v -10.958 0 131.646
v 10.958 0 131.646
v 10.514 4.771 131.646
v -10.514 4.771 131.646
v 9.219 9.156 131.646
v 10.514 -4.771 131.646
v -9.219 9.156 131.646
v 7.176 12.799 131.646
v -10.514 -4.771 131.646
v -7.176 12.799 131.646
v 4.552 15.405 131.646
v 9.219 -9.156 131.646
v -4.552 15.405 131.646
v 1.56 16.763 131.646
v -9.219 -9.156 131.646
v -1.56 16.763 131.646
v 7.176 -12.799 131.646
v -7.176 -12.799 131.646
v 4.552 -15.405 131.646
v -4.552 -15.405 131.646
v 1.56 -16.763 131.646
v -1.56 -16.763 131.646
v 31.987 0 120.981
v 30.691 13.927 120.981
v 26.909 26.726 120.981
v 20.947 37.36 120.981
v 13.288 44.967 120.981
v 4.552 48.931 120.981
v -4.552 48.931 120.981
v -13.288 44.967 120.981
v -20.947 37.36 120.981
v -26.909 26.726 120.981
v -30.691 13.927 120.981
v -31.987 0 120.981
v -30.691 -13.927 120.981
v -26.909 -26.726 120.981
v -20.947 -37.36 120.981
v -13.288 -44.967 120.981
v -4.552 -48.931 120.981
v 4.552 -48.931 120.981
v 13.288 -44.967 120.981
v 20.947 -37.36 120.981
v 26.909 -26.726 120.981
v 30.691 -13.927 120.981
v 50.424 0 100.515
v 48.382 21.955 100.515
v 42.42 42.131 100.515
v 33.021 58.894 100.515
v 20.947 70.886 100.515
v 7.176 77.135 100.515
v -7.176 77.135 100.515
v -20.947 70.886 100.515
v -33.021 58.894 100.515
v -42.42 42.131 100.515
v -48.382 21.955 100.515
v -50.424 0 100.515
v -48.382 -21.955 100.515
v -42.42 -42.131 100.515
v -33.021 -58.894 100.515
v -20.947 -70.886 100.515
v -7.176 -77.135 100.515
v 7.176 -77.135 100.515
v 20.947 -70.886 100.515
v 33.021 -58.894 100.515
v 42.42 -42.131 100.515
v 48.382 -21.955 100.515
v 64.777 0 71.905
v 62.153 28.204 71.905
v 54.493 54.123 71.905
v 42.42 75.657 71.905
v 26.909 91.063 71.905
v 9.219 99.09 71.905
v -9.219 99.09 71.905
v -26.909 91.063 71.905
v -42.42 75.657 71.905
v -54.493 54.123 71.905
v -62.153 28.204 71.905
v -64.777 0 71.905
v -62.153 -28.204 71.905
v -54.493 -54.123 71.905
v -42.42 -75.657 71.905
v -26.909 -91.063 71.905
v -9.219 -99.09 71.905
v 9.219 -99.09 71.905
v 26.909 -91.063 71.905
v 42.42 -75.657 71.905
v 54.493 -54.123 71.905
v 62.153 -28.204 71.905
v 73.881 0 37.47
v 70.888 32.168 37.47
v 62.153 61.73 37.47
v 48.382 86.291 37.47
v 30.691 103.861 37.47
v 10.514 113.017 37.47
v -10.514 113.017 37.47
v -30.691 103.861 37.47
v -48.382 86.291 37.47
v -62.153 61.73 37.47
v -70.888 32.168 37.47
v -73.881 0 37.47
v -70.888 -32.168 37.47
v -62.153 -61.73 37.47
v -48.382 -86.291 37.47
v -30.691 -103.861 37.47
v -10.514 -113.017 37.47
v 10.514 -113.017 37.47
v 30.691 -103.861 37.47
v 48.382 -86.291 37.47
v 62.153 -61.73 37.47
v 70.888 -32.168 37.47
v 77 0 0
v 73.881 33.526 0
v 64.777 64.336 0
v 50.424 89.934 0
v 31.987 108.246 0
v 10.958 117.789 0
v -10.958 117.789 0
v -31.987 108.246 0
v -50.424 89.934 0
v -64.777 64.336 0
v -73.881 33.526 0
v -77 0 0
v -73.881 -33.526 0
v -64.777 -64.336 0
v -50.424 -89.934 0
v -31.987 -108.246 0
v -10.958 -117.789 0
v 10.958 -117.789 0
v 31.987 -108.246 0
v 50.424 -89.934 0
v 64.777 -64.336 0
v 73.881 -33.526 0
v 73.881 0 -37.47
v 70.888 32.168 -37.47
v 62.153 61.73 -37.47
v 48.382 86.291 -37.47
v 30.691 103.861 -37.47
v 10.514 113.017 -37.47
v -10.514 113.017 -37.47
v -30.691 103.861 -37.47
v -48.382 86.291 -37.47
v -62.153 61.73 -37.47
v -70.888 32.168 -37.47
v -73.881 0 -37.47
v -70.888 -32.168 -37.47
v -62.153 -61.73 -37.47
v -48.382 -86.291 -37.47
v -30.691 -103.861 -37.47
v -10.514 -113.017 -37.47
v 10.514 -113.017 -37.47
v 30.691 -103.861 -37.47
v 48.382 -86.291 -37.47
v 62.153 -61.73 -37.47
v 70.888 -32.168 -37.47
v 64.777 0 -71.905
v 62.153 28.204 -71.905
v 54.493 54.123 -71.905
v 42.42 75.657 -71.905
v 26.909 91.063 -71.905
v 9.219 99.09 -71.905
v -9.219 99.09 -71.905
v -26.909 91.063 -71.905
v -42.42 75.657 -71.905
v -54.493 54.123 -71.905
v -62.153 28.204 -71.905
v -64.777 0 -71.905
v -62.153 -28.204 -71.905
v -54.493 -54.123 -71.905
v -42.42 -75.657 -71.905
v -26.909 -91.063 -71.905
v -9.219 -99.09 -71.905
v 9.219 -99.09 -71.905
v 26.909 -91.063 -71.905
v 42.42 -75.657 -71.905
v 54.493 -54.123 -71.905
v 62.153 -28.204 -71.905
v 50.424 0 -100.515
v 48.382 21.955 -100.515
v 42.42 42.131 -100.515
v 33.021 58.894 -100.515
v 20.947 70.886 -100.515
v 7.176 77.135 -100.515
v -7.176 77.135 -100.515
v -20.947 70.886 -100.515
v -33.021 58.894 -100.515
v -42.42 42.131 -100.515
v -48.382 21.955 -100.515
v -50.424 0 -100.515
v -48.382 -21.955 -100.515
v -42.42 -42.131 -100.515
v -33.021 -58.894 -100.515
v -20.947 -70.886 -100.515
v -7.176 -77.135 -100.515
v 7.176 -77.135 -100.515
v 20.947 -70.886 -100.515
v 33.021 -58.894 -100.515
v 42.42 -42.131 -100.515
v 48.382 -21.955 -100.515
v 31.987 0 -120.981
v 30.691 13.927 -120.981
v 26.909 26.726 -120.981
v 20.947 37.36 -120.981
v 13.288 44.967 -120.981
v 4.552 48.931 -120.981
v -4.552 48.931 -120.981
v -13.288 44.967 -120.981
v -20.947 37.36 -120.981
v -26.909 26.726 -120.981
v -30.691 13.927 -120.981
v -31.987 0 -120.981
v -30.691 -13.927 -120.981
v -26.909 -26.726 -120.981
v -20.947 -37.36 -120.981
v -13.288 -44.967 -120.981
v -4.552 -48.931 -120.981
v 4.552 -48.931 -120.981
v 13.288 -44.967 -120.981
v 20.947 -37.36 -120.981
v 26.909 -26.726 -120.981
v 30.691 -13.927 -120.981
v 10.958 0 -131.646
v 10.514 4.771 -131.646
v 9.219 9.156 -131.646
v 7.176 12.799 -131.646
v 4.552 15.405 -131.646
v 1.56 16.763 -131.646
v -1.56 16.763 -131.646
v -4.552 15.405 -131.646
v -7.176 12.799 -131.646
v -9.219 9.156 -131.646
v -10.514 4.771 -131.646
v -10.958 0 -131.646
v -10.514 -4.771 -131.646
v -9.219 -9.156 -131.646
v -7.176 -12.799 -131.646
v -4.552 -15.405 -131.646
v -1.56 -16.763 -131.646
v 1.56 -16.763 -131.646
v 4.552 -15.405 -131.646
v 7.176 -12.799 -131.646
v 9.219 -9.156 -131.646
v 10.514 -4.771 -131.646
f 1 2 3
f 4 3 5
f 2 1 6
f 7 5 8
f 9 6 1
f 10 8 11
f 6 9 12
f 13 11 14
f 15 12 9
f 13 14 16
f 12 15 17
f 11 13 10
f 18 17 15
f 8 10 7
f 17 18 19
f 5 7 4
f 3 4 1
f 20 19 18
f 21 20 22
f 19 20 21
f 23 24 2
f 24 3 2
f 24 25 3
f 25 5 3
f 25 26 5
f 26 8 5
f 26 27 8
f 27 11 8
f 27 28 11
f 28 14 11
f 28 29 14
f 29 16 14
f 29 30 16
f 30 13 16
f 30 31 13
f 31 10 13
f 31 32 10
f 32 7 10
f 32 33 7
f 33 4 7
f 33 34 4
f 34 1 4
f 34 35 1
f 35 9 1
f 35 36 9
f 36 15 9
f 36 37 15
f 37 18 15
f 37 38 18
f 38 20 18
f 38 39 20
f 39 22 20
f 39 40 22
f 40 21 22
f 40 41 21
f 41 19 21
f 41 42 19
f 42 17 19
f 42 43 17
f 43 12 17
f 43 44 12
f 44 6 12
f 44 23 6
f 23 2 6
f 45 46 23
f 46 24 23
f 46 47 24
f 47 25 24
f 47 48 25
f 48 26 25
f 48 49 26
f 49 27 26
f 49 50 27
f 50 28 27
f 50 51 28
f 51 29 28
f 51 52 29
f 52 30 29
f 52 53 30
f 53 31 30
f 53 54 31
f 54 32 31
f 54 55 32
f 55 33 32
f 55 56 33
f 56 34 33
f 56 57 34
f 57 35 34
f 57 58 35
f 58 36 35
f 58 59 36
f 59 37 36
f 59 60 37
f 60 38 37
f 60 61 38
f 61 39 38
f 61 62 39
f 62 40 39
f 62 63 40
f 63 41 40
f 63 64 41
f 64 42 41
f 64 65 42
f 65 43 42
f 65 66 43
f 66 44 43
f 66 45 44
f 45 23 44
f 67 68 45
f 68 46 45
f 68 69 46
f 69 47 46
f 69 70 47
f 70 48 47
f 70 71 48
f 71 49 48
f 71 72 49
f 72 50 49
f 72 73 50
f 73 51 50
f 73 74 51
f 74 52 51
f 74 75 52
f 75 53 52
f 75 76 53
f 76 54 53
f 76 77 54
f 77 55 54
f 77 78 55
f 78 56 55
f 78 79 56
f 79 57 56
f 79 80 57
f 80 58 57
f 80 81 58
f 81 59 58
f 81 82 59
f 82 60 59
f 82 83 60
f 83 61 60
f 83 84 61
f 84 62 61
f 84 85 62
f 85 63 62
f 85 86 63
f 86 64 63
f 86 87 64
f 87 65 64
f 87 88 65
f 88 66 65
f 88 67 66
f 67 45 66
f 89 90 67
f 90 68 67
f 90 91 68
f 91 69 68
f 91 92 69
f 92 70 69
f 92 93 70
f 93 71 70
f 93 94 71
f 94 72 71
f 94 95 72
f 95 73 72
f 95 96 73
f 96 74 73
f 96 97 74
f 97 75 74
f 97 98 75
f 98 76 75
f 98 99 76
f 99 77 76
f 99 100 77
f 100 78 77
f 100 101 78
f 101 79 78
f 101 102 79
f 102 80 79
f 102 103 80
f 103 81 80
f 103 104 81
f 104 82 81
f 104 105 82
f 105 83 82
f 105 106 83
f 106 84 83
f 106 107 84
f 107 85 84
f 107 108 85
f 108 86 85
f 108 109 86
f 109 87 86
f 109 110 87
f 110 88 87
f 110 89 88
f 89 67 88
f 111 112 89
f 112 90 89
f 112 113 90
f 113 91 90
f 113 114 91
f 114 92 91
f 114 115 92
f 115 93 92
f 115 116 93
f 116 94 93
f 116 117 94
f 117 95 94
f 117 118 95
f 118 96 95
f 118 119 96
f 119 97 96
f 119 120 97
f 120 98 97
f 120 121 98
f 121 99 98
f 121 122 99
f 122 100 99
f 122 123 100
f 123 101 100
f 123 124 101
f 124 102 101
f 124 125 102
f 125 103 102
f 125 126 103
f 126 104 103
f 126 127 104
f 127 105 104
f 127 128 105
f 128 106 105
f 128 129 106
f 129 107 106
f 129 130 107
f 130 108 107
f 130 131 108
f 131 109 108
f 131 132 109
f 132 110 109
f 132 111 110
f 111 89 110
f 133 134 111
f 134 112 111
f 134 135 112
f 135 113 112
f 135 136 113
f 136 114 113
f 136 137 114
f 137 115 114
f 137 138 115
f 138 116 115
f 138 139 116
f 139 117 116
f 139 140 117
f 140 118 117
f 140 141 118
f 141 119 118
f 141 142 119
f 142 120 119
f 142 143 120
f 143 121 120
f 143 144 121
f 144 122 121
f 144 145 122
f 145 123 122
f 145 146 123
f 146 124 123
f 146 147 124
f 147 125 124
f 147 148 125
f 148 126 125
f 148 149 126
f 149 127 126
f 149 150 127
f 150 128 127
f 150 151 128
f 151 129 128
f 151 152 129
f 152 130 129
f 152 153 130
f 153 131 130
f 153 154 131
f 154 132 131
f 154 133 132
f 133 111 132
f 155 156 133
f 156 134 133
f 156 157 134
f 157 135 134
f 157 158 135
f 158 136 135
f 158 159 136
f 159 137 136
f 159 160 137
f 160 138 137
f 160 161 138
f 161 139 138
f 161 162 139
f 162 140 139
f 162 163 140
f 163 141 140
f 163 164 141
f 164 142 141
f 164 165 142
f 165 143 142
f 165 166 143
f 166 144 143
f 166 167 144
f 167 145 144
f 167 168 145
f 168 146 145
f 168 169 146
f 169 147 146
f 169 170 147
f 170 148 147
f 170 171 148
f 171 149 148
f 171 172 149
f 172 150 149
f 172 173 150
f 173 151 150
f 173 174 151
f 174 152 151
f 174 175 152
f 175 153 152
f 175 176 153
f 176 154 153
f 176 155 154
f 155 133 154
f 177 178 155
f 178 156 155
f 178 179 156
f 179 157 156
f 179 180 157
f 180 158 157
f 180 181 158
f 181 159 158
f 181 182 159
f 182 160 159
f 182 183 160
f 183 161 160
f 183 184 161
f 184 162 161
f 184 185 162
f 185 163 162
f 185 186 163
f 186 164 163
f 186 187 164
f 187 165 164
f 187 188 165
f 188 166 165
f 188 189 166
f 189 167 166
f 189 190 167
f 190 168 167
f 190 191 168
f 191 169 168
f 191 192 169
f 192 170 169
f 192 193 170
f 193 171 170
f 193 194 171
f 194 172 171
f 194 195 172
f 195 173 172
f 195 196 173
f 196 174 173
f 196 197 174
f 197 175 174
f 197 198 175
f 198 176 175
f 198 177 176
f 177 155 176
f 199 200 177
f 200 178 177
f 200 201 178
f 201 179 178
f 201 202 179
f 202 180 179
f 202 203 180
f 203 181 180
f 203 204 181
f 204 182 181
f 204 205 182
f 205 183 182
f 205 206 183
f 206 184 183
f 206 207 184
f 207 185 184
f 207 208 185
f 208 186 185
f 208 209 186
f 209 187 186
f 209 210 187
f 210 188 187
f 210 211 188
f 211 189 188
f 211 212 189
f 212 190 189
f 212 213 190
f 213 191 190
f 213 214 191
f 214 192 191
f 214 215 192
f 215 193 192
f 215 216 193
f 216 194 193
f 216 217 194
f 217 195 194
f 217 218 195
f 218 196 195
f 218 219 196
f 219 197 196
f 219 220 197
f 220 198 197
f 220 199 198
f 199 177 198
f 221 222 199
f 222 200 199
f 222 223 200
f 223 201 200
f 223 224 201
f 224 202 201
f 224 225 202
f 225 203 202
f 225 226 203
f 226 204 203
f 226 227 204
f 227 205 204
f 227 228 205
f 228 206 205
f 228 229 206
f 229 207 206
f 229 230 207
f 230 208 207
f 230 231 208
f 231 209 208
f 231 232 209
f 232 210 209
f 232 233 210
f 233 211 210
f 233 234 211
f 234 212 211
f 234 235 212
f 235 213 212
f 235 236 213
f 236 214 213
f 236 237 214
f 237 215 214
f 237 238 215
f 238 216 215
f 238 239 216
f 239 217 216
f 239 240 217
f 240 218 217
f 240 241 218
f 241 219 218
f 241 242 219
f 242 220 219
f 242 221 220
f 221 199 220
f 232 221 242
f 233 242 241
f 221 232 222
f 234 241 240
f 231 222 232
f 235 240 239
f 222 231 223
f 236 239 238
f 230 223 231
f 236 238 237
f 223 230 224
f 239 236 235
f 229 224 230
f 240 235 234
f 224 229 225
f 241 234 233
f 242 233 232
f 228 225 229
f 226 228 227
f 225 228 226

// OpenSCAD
// Generated by SolidPython 1.0.1 on 2020-07-29 00:46:50


scale(v = [11, 17, 19]) {
	sphere(r = 7);
}
/***********************************************
*********      SolidPython code:      **********
************************************************
 
# import packages: SolidPython
from solid import *
from solid.utils import *
from itertools import chain, combinations, permutations


class Resize:

    def __init__(self, scad_file):
        self.scad_file = scad_file
        #self.scad_file = import_scad(scad_file)
        # cone/cylinder param:
        self.r1 = 0
        self.r2 = 0
        self.h = 0
        # rectangular prism param:
        self.w = 0
        self.l = 0
        # ellipse param:
        self.r = 0

    # import OpenScad code (file name corresponds to shape)


    # classify shape + parameters
    def assign(self, param1, param2, param3):
        if self.scad_file == 'cone.scad':
            self.r1 = param1
            self.r2 = param2
            self.h = param3
        elif self.scad_file == 'cylinder.scad':
            self.r1 = param1
            self.r2 = param2
            self.h = param3
        elif self.scad_file == 'rectangularPrism.scad':
            self.h = param1
            self.l = param2
            self.w = param3
        else:
            self.r = param1
            self.h = param2

    # resize parameters
    def iterate(self):
        x = range(3, 20, 2)
        i = 1
        if self.scad_file == 'cone.scad':
            tempList = list(permutations(x, 2))
            for temp in tempList:
                param1 = temp[0]
                param2 = temp[1]
                filepath = 'produced_scad_files/' + 'cone' + str(param1) + '_' + str(param2) + '_' + '.scad'
                scad_render_to_file(cylinder(h=param1, r1=param2, r2=0), filepath)

        elif self.scad_file == 'cylinder.scad':
            tempList = list(permutations(x, 3))
            for temp in tempList:
                param1 = temp[0]
                param2 = temp[1]
                filepath = 'produced_scad_files/' + 'cylinder' + str(param1) + '_' + str(param2) + '_' + '.scad'
                scad_render_to_file(cylinder(h=param1, r1=param2, r2=param2), filepath)

        elif self.scad_file == 'rectangularPrism.scad':
            tempList = list(permutations(x, 3))
            for temp in tempList:
                param1 = temp[0]
                param2 = temp[1]
                param3 = temp[2]
                filepath = 'produced_scad_files/' + 'rectangularPrism' + str(param1) + '_' + str(param2) + '_' + str(
                    param3) + '.scad'
                scad_render_to_file(cube(size=(param1, param2, param3)), filepath)

        elif self.scad_file == 'ellipse.scad':
            tempList = list(permutations(x, 4))
            for temp in tempList:
                param1 = temp[0]
                param2 = temp[1]
                param3 = temp[2]
                param4 = temp[3]
                filepath = 'produced_scad_files/' + 'ellipse' + str(param1) + '_' + str(param2) + '_' + str(param3) + '_' + str(param4) + '.scad'
                scad_render_to_file(scale([param1, param2, param3])(sphere(r=param4)), filepath)

    def render_to_scadfile(self):
        scad_render_to_file(scad, 'example.scad') 
 
************************************************/
